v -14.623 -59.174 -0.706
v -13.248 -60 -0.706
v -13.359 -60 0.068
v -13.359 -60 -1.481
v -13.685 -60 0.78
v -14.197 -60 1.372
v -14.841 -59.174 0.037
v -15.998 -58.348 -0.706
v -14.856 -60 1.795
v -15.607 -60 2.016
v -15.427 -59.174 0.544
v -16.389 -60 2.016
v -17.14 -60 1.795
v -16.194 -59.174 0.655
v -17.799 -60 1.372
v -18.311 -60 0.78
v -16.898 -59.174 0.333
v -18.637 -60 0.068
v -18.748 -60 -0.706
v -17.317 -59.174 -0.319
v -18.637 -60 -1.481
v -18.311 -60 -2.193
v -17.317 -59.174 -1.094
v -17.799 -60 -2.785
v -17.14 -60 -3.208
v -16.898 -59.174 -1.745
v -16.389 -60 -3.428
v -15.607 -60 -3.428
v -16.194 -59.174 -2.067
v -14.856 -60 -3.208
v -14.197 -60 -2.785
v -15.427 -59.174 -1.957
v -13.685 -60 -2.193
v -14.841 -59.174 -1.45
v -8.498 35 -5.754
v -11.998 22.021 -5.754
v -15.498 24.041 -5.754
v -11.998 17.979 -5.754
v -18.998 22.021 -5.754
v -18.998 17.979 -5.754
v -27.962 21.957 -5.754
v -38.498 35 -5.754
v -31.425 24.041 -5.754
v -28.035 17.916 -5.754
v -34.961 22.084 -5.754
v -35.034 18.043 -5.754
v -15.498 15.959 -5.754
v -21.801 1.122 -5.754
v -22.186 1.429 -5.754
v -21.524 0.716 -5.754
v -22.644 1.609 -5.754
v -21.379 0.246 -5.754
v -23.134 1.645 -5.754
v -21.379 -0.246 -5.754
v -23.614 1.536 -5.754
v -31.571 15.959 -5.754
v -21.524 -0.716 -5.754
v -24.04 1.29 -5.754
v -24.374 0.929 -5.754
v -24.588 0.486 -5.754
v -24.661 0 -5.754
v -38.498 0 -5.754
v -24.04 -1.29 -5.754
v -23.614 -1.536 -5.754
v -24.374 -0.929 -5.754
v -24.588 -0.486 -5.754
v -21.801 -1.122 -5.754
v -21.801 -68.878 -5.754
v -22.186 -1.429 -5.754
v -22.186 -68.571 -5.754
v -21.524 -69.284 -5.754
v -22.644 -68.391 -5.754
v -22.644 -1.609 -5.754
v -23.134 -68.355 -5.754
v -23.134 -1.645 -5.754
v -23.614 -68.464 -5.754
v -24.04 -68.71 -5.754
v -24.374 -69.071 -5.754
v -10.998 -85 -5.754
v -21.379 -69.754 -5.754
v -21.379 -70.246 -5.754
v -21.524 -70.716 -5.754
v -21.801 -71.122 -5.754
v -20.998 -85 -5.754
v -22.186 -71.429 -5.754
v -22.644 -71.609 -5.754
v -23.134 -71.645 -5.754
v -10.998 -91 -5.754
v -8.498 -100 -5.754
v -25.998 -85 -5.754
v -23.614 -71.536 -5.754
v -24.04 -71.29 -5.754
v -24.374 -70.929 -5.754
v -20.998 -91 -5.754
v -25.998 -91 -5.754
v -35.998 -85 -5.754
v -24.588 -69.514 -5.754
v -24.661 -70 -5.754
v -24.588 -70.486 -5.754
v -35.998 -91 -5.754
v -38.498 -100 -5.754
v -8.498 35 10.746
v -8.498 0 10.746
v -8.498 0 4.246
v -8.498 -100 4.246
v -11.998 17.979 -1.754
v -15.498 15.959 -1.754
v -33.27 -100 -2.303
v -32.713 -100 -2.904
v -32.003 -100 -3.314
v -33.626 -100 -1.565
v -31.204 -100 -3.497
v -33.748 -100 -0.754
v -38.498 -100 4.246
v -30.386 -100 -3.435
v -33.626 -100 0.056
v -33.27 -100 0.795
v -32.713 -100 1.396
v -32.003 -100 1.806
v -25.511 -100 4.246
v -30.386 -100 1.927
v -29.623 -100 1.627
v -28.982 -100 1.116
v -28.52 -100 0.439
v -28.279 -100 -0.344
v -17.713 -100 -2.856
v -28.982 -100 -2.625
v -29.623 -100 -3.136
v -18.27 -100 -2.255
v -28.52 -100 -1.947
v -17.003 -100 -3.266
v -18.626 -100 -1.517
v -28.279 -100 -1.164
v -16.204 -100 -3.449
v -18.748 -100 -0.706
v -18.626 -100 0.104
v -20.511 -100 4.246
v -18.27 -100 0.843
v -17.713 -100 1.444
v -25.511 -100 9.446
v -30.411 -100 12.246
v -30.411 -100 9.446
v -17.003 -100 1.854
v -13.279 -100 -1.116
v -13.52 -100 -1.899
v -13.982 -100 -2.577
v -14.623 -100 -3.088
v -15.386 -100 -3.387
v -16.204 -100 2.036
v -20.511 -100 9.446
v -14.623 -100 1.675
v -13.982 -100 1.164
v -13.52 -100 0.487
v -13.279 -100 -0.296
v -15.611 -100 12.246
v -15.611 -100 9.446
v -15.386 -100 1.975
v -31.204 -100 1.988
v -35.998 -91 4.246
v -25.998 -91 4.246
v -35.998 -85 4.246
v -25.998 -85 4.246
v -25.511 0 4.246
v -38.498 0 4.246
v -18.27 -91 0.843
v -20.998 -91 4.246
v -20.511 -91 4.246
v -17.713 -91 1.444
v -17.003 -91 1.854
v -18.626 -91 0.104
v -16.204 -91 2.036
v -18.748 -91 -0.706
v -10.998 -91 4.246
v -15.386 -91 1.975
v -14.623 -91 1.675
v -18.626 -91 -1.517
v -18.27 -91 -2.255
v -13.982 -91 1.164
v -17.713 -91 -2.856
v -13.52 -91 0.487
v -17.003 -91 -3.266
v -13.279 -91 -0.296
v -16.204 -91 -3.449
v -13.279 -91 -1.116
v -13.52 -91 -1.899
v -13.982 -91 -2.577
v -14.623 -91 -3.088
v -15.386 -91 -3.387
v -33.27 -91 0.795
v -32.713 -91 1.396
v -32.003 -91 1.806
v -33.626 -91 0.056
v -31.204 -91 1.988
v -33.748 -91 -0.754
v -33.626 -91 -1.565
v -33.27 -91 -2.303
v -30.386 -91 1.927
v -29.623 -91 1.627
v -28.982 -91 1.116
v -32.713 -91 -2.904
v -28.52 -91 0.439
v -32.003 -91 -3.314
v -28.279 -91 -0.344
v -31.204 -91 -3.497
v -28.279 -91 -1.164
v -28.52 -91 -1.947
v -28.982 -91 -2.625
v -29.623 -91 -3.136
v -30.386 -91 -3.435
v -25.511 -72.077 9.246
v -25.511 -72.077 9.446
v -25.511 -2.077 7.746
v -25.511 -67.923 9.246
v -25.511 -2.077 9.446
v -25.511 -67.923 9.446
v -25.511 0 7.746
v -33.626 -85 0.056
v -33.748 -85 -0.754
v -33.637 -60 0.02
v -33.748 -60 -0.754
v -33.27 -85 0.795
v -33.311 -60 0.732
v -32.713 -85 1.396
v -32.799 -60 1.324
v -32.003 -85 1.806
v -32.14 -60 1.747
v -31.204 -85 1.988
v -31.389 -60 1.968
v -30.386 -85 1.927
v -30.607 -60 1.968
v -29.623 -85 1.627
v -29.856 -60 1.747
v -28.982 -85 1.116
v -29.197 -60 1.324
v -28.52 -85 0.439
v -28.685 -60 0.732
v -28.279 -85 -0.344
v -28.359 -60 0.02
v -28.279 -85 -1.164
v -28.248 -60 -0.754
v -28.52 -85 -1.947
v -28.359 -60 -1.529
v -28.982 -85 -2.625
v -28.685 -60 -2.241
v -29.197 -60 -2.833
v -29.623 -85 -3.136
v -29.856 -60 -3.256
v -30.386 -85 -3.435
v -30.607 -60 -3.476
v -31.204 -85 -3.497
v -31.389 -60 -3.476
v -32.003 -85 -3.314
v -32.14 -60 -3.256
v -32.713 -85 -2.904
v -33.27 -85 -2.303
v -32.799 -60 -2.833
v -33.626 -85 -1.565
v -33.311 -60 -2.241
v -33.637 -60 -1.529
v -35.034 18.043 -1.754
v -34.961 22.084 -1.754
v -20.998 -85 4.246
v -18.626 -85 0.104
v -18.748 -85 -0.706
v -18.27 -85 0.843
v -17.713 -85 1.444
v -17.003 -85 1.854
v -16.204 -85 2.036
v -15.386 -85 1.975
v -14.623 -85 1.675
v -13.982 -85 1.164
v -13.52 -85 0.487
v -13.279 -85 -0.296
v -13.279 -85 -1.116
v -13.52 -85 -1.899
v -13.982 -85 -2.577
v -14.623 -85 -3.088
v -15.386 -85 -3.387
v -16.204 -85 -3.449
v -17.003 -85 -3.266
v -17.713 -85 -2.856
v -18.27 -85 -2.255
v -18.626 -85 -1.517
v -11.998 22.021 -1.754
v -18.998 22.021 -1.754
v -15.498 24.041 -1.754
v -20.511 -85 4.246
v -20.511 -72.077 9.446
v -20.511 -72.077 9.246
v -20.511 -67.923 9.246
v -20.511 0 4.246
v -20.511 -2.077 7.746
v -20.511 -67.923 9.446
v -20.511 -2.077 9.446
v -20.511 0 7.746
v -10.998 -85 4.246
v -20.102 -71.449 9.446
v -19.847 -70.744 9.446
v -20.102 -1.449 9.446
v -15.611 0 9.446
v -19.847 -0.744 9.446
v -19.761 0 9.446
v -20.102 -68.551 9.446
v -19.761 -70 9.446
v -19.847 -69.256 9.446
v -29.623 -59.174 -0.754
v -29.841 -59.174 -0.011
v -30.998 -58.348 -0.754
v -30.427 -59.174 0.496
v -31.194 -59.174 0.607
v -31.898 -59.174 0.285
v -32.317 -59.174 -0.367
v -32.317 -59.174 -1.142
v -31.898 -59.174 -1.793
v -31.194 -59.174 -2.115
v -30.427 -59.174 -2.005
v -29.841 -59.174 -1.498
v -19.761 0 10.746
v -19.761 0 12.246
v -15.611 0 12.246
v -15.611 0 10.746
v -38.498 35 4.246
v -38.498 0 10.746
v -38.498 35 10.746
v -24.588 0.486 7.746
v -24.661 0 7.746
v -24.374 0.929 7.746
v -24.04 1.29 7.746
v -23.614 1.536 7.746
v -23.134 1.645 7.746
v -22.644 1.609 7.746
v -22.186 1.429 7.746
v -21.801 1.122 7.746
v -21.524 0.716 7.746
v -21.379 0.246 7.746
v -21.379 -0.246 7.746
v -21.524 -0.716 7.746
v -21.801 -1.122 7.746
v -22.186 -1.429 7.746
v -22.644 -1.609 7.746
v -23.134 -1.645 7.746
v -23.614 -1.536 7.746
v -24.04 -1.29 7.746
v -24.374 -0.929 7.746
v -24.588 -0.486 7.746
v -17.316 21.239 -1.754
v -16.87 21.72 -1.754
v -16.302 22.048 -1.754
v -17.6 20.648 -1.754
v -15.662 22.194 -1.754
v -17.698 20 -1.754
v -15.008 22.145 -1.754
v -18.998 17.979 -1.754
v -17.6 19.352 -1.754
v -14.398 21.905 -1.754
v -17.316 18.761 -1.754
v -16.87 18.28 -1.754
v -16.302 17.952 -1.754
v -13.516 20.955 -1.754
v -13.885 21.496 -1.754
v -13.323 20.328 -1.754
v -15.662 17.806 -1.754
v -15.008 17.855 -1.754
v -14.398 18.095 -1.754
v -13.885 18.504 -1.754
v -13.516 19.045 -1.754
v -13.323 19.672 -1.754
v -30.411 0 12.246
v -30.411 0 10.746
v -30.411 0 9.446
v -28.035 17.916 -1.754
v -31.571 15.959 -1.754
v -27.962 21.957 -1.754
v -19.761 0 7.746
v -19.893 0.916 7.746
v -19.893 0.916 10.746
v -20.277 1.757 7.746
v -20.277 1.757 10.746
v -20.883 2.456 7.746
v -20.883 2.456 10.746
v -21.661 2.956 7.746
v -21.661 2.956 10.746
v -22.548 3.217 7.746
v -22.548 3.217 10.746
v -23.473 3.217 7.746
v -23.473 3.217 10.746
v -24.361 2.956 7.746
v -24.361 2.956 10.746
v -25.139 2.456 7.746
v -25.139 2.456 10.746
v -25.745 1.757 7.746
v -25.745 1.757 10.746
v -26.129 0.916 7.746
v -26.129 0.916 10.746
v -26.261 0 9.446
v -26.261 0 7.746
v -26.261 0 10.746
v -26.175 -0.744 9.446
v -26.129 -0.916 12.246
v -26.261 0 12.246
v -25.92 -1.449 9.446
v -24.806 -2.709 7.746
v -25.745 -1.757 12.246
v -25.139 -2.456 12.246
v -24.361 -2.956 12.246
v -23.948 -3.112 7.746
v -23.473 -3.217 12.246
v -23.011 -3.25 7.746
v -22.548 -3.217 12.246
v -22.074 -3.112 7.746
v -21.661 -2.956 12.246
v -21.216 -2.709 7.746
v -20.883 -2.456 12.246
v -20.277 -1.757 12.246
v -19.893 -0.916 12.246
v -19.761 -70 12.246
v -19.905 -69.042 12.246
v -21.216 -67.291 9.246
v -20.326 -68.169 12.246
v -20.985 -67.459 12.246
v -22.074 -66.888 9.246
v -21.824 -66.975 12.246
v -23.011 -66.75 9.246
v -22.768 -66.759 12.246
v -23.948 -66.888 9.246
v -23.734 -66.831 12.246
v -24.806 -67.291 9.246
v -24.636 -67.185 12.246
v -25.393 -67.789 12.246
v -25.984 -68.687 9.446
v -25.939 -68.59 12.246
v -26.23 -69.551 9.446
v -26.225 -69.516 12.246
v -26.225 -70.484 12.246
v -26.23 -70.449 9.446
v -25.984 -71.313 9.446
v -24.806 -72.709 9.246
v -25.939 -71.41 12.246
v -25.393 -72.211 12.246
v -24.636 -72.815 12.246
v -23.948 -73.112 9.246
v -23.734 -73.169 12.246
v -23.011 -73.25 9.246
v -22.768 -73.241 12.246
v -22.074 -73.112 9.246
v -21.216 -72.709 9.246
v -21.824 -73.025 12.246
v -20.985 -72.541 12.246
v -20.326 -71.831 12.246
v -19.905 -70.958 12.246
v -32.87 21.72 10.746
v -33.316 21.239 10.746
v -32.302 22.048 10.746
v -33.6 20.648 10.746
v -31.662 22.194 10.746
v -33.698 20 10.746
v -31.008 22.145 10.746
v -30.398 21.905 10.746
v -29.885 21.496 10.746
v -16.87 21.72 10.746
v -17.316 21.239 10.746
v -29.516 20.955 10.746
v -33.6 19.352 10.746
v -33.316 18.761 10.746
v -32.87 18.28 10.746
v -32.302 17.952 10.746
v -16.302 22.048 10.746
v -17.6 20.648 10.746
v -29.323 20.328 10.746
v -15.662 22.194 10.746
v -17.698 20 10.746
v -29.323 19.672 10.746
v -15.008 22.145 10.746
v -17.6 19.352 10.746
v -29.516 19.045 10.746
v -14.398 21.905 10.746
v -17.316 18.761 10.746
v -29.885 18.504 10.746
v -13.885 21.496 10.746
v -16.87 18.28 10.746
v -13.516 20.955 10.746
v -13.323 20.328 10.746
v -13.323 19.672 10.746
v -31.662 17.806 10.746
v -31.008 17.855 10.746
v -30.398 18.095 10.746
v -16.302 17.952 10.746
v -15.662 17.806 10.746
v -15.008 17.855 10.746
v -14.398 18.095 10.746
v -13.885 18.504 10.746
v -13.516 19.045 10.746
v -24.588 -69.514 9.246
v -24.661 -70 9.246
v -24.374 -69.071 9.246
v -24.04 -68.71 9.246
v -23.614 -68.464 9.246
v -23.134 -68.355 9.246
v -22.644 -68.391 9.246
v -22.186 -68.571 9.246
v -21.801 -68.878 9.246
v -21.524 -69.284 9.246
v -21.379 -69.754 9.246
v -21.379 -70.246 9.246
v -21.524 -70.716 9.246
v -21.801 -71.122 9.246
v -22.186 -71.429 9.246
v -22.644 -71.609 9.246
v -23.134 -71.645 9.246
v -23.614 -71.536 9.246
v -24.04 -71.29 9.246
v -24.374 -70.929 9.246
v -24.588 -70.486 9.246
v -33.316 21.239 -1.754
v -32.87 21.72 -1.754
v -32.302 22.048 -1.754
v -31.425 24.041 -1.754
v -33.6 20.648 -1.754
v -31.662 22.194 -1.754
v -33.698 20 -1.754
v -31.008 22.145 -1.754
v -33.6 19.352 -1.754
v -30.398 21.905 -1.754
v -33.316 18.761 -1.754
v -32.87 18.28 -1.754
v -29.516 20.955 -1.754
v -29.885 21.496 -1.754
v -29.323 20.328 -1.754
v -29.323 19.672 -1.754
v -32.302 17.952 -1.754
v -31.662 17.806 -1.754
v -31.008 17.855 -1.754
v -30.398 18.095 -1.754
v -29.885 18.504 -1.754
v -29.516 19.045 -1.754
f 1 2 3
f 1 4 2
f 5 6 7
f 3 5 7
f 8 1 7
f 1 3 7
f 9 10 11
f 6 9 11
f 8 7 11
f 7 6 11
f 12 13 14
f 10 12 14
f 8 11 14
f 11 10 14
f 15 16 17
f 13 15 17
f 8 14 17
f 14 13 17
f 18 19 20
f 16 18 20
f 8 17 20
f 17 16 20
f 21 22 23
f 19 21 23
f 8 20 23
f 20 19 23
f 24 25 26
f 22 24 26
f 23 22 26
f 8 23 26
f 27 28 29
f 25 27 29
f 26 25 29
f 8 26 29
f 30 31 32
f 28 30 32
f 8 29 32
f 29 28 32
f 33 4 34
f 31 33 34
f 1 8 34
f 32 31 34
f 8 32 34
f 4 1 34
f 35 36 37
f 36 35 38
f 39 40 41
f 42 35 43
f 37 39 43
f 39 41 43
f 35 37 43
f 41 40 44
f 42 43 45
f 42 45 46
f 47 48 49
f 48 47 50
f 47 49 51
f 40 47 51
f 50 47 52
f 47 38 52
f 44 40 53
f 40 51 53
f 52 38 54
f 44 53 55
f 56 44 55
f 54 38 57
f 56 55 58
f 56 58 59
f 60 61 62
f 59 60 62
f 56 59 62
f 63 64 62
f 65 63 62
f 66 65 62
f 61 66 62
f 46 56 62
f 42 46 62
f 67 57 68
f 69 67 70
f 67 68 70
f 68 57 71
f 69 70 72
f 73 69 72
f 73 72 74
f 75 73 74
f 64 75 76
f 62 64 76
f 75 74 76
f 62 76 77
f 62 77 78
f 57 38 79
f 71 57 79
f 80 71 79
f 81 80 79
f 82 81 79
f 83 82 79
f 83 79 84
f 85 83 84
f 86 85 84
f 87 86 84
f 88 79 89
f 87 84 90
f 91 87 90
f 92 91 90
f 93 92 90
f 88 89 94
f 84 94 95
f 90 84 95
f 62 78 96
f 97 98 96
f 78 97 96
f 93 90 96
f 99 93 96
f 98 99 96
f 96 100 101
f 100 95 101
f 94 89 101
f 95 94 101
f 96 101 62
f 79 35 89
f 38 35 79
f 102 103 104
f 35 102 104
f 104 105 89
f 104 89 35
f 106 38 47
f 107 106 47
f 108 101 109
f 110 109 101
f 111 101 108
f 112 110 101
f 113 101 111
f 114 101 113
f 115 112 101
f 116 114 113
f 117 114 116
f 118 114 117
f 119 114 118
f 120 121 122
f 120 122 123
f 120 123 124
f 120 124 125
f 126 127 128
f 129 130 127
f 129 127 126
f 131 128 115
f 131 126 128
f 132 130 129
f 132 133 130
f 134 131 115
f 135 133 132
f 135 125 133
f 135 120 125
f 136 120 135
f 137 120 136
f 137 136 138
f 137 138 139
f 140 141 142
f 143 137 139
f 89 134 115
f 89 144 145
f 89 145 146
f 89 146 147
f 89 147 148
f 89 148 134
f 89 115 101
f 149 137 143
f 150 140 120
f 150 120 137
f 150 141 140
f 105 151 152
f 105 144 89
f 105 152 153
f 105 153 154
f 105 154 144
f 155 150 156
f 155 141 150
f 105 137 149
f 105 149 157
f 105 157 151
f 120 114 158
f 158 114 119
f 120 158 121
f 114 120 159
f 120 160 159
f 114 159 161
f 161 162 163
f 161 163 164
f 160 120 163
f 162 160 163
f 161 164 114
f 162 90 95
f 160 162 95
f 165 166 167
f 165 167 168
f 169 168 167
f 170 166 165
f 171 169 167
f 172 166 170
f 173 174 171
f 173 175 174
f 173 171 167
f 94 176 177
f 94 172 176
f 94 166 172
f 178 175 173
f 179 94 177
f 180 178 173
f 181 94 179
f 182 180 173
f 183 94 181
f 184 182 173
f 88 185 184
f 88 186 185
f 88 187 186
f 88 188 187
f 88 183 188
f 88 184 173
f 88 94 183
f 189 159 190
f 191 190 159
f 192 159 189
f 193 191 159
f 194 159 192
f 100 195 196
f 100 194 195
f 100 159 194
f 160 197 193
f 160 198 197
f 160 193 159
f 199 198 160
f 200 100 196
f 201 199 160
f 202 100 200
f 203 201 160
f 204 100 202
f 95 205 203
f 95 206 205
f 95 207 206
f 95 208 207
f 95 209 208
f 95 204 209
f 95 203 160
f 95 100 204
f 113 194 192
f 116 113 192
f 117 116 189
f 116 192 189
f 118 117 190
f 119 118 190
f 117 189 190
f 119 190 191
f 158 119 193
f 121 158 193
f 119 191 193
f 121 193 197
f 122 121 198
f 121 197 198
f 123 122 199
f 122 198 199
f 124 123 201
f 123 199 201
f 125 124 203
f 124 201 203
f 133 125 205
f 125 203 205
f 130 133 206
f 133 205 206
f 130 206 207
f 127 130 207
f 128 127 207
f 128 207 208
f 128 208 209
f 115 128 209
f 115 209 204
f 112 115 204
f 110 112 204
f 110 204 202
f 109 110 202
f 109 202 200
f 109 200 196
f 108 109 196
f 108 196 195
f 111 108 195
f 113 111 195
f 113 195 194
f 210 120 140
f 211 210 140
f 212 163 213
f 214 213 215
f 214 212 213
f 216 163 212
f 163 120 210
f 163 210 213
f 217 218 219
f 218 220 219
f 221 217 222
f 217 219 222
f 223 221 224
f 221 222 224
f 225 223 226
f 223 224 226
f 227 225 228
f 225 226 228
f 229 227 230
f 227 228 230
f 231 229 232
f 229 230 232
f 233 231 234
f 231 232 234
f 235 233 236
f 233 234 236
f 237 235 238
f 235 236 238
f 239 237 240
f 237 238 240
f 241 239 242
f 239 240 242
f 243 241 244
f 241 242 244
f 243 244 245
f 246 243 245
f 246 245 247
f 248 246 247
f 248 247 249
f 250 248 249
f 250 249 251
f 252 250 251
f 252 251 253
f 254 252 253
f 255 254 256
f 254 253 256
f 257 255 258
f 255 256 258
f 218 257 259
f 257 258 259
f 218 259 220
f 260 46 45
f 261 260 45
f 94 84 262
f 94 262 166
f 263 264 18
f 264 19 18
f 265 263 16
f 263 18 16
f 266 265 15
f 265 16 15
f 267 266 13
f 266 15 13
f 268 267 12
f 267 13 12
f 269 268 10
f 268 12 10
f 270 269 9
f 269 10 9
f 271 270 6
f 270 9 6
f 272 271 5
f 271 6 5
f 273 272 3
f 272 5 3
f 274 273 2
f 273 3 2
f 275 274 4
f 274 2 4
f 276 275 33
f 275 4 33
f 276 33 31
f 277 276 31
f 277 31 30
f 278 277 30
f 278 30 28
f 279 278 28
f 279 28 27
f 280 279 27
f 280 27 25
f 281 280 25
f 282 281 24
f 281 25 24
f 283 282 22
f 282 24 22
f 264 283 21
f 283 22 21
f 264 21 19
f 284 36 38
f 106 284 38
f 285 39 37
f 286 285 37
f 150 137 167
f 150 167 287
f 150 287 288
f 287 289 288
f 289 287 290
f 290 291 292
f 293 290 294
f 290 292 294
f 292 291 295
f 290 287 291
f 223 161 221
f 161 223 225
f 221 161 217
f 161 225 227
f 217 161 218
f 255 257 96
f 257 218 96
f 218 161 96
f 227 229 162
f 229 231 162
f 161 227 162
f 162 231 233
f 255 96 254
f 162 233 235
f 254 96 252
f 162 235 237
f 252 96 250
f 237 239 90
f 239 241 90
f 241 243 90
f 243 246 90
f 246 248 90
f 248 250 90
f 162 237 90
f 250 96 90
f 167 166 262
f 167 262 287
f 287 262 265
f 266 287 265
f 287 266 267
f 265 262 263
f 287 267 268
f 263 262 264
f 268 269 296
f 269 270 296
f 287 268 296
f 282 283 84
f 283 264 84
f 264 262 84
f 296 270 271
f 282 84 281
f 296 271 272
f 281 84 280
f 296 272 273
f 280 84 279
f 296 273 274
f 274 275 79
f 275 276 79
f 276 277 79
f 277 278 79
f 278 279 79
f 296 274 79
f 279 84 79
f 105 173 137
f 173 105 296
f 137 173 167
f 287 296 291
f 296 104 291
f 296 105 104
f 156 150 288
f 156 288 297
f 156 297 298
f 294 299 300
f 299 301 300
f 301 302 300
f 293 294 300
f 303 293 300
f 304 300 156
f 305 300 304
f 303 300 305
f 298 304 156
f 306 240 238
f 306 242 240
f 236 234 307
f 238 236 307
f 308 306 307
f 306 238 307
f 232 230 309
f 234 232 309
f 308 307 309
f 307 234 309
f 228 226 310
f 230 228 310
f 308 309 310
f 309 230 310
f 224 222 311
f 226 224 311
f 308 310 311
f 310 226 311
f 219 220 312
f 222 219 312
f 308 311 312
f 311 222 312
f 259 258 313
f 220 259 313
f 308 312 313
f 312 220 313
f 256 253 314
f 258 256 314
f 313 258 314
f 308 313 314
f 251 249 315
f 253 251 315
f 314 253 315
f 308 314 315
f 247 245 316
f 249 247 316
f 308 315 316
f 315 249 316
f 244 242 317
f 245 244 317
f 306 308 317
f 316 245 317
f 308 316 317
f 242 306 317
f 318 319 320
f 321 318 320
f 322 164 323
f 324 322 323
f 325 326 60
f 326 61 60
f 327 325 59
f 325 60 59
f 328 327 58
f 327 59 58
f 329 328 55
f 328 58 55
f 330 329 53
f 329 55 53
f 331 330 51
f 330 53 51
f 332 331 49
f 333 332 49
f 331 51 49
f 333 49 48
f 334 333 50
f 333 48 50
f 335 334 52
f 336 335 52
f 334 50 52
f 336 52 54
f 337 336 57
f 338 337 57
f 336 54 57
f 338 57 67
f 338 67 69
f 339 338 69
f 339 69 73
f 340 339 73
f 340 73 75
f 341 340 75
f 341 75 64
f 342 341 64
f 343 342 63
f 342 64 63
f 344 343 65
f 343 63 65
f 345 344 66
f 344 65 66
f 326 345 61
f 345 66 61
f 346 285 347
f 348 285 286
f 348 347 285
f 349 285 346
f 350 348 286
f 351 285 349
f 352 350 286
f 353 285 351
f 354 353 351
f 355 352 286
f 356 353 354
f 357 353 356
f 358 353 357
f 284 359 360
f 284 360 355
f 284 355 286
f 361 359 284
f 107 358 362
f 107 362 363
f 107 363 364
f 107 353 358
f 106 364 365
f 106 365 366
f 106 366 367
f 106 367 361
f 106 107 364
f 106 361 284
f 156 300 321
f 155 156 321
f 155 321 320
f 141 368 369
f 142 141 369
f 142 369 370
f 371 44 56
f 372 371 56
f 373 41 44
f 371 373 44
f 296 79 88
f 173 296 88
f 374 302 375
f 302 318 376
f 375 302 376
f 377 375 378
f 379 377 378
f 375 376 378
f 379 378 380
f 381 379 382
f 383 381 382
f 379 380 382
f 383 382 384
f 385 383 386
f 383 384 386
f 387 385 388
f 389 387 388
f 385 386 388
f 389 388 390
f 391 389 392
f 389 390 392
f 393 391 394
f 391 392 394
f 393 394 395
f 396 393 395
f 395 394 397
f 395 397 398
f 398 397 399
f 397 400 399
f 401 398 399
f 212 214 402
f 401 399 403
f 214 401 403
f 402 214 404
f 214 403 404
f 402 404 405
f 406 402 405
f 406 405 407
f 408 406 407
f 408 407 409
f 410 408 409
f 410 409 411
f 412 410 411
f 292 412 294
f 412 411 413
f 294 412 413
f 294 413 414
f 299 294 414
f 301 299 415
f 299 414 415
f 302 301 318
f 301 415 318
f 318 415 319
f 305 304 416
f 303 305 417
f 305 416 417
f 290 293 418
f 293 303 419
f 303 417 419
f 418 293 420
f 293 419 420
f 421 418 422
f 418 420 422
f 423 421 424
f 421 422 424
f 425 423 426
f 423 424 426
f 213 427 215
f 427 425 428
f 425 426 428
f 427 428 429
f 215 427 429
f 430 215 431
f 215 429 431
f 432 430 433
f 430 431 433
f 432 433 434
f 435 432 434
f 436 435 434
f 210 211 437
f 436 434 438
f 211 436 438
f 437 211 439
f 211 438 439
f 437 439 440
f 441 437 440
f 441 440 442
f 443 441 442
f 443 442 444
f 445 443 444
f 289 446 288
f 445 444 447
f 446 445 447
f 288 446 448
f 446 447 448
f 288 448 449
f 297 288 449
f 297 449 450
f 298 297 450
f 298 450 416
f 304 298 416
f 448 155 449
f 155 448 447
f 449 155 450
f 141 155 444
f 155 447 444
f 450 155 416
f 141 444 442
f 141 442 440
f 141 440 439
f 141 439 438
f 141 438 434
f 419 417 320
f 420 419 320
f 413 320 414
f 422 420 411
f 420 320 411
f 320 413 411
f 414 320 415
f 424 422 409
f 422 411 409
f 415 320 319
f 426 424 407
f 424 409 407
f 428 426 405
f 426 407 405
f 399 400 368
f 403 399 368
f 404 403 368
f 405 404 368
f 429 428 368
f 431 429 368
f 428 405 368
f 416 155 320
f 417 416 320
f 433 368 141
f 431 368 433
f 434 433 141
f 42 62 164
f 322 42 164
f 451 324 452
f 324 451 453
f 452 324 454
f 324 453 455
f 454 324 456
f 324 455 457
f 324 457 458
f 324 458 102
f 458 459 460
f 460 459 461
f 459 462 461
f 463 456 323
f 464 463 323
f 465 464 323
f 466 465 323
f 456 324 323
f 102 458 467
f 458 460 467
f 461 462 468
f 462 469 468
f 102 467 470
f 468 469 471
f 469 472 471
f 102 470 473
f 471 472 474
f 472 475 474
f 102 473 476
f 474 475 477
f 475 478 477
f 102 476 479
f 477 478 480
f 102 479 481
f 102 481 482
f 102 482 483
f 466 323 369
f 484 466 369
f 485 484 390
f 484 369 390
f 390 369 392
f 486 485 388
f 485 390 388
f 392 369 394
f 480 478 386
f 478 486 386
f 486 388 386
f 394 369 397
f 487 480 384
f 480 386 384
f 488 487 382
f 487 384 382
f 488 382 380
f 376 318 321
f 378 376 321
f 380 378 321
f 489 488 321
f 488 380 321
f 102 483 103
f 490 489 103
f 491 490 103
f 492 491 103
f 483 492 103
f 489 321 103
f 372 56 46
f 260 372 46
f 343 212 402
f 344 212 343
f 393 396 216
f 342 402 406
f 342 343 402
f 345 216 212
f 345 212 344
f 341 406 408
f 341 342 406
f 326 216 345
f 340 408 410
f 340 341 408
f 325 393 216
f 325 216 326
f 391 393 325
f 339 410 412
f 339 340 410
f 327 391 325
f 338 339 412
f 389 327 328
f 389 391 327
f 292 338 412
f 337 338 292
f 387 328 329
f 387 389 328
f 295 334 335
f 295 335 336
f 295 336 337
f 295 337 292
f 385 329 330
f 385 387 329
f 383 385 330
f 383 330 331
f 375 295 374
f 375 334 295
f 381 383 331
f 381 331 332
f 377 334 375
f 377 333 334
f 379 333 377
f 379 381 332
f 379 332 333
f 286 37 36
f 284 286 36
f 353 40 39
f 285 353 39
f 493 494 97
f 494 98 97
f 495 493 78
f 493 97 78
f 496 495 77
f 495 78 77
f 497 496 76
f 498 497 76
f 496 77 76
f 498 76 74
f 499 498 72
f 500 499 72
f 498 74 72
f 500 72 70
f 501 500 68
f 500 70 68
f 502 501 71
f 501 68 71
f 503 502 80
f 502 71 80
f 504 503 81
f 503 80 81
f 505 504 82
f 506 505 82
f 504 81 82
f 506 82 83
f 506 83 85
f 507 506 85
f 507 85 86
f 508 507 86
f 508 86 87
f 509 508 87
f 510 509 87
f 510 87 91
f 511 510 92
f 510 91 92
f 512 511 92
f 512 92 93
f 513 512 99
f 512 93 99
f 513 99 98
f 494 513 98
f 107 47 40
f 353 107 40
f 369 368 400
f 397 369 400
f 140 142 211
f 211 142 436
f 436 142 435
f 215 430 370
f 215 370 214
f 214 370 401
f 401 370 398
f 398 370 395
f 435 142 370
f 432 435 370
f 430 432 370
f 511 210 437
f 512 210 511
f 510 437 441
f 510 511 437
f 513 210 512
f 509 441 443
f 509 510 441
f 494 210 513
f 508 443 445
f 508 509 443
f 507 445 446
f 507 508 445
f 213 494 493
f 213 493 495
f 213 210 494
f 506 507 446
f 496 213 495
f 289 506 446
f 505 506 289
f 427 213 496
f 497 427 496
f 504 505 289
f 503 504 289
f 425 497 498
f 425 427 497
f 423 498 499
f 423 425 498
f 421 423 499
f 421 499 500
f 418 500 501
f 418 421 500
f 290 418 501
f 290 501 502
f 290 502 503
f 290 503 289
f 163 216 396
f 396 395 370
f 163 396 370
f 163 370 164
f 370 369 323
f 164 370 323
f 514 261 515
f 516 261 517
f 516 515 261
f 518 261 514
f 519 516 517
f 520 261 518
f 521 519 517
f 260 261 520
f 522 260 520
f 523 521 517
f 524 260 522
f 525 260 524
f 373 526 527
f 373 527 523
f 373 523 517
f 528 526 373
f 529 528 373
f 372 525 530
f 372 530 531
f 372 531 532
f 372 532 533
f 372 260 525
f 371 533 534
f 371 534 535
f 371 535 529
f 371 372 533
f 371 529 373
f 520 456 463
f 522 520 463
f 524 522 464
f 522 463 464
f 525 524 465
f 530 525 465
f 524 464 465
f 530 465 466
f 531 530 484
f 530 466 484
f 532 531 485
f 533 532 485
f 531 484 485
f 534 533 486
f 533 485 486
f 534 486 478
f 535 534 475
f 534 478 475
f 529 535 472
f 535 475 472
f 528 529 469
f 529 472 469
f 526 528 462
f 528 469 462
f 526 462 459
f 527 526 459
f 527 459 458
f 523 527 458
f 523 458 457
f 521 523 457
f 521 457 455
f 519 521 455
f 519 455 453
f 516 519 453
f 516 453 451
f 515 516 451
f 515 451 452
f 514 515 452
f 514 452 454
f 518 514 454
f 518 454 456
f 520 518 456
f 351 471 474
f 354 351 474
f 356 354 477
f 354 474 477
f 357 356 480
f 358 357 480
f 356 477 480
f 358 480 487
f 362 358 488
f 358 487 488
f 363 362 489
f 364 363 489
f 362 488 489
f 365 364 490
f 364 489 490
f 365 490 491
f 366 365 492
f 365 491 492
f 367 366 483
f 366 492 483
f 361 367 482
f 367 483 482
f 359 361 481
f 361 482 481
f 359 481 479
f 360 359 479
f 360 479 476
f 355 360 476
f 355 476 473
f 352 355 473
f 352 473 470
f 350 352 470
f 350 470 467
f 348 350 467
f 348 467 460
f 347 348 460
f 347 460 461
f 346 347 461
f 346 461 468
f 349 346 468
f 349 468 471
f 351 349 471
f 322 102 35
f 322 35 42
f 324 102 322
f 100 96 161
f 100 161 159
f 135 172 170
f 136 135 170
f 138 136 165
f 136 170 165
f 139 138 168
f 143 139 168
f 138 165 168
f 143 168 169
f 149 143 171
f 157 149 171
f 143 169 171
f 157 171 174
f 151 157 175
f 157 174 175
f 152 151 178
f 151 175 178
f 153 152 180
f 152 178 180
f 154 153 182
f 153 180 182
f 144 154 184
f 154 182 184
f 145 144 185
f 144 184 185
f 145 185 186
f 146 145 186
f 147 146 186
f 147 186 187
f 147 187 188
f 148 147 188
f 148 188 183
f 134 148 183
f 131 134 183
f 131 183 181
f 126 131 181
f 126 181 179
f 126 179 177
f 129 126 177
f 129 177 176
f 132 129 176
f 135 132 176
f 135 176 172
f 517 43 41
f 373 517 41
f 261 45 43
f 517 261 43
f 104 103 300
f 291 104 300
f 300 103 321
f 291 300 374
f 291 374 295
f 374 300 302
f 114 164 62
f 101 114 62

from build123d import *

# Parameters (mm, degrees)
F0_R            = 2.5000000706
F0_R_2          = 2.5000000298
F0_W            = 4.9999998882
F0_H            = 5.2
F1_DEPTH        = 100
F3_DEPTH        = 35
F6_D            = 4.4
F6_DEPTH        = 40
F6_TIP          = 1.3218933619
F5_W            = 10
F5_H            = 6
F7_DEPTH        = 10
F9_D            = 5.5
F9_DEPTH        = 40
F9_TIP          = 1.6523667023
F11_D           = 3.3
F11_DEPTH       = 20
F11_START       = 1.4999997
F11_CBORE_D     = 6.5
F11_CBORE_DEPTH = 3
F11_TIP         = 0.9914200214
F12_DEPTH       = 4


# Not quite as in the source:
# - after a boolean that leaves OpenCascade's solid faulty, fix() repairs it
# - ends of sketch curves that miss each other by under 0.0002 mm in the source are joined
# - a feature names something its author has since deleted; it is built from what else it names


with BuildPart() as f1:
    # F0 (on Front) → F1 (new body)
    with BuildSketch(Plane.XZ):
        Polygon((-38.4980148883, 4.2457092745), (-38.4980148883, -5.7542903855), (-8.4980155588, -5.7542903855), (-8.4980155588, 4.2457092745), (-15.6109269008, 4.2457092745), (-20.5109269008, 4.2457092745), (-25.510926789, 4.2457092745), (-30.410926789, 4.2457092745), align=None)
        with Locations((-30.9980151824, -0.7542907016)):
            Circle(F0_R, mode=Mode.SUBTRACT)
        with Locations((-15.9980151584, -0.7062930843)):
            Circle(F0_R_2, mode=Mode.SUBTRACT)
        with Locations((-23.0109268449, 6.8457092745)):
            Rectangle(F0_W, F0_H)
        with Locations((-30.9980151824, -0.7542907016)):
            Circle(F0_R)
        with Locations((-15.9980151584, -0.7062930843)):
            Circle(F0_R_2)
        Polygon((-30.410926789, 12.2457092745), (-30.410926789, 9.4457092745), (-25.510926789, 9.4457092745), (-20.5109269008, 9.4457092745), (-15.6109269008, 9.4457092745), (-15.6109269008, 12.2457092745), align=None)
    extrude(amount=F1_DEPTH)

    # F2 (on face) → F3 (join)
    with BuildSketch(Plane(origin=(0, 0, 0), x_dir=(-1, 0, 0), z_dir=(0, 1, 0))):
        Polygon((8.4980155588, 10.7457096145), (8.4980155588, 4.2457092745), (20.5109269008, 4.2457092745), (20.5109269008, 9.4457092745), (15.6109269008, 9.4457092745), (15.6109269008, 10.7457096145), align=None)
        Polygon((25.510926789, 4.2457092745), (38.4980148883, 4.2457092745), (38.4980155588, 10.7457096145), (30.410926789, 10.7457096145), (30.410926789, 9.4457092745), (25.510926789, 9.4457092745), align=None)
        Polygon((8.4980155588, 4.2457092745), (8.4980155588, -5.7542903855), (38.4980155588, -5.7542903855), (38.4980155588, 4.2457092745), (25.510926789, 4.2457092745), (25.510926789, 9.4457092745), (30.410926789, 9.4457092745), (30.410926789, 10.7457096145), (15.6109269008, 10.7457096145), (15.6109269008, 9.4457092745), (20.5109269008, 9.4457092745), (20.5109269008, 4.2457092745), align=None)
    extrude(amount=F3_DEPTH)

    # F4: union 

    # F6
    with Locations(Plane(origin=(0, 0, -5.7542903855), x_dir=(1, 0, 0), z_dir=(0, 0, -1))):
        with Locations((-15.4980155588, -20), (-31.4980148883, -20)):
            Hole(F6_D / 2, depth=F6_DEPTH)
            with Locations((0, 0, -(F6_DEPTH + F6_TIP / 2))):  # 118° drill point
                Cone(0, F6_D / 2, F6_TIP, mode=Mode.SUBTRACT)

    # F5 (on face) → F7 (cut)
    with BuildSketch(Plane(origin=(0, 0, -5.7542903855), x_dir=(1, 0, 0), z_dir=(0, 0, -1))):
        with Locations((-15.9980155588, 88)):
            Rectangle(F5_W, F5_H)
        with Locations((-30.9980148883, 88)):
            Rectangle(F5_W, F5_H)
    extrude(amount=-F7_DEPTH, mode=Mode.SUBTRACT)

    add(f1.part.fix(), mode=Mode.REPLACE)

    # F9
    with Locations(Plane.XZ.offset(100)):
        with Locations((-30.9980151824, -0.7542907016), (-15.9980151584, -0.7062930843)):
            Hole(F9_D / 2, depth=F9_DEPTH)
            with Locations((0, 0, -(F9_DEPTH + F9_TIP / 2))):  # 118° drill point
                Cone(0, F9_D / 2, F9_TIP, mode=Mode.SUBTRACT)

    # F11
    # its depths count from where the whole tool has entered the part; down to there all is cleared
    with Locations(Plane.XY.offset(12.2457092745)):
        with Locations((-23.0109268449, 0, -F11_START), (-23.0109268449, -70, 0)):
            CounterBoreHole(F11_D / 2, F11_CBORE_D / 2, F11_CBORE_DEPTH, depth=F11_DEPTH)
            with Locations((0, 0, -(F11_DEPTH + F11_TIP / 2))):  # 118° drill point
                Cone(0, F11_D / 2, F11_TIP, mode=Mode.SUBTRACT)

    # F5 (on face) → F12 (cut)
    with BuildSketch(Plane(origin=(0, 0, -5.7542903855), x_dir=(1, 0, 0), z_dir=(0, 0, -1))):
        Polygon((-18.9980155588, -17.9792740578), (-18.9980155588, -22.0207259422), (-15.4980155588, -24.0414518843), (-11.9980155588, -22.0207259422), (-11.9980155588, -17.9792740578), (-15.4980155588, -15.9585481157), align=None)
        Polygon((-31.4247349717, -24.0407874712), (-27.9619503287, -21.9569314662), (-28.0352302453, -17.9161439951), (-31.5712948049, -15.9592125288), (-35.0340794479, -18.0430685338), (-34.9607995313, -22.0838560049), align=None)
    extrude(amount=-F12_DEPTH, mode=Mode.SUBTRACT)


solid = f1.part
